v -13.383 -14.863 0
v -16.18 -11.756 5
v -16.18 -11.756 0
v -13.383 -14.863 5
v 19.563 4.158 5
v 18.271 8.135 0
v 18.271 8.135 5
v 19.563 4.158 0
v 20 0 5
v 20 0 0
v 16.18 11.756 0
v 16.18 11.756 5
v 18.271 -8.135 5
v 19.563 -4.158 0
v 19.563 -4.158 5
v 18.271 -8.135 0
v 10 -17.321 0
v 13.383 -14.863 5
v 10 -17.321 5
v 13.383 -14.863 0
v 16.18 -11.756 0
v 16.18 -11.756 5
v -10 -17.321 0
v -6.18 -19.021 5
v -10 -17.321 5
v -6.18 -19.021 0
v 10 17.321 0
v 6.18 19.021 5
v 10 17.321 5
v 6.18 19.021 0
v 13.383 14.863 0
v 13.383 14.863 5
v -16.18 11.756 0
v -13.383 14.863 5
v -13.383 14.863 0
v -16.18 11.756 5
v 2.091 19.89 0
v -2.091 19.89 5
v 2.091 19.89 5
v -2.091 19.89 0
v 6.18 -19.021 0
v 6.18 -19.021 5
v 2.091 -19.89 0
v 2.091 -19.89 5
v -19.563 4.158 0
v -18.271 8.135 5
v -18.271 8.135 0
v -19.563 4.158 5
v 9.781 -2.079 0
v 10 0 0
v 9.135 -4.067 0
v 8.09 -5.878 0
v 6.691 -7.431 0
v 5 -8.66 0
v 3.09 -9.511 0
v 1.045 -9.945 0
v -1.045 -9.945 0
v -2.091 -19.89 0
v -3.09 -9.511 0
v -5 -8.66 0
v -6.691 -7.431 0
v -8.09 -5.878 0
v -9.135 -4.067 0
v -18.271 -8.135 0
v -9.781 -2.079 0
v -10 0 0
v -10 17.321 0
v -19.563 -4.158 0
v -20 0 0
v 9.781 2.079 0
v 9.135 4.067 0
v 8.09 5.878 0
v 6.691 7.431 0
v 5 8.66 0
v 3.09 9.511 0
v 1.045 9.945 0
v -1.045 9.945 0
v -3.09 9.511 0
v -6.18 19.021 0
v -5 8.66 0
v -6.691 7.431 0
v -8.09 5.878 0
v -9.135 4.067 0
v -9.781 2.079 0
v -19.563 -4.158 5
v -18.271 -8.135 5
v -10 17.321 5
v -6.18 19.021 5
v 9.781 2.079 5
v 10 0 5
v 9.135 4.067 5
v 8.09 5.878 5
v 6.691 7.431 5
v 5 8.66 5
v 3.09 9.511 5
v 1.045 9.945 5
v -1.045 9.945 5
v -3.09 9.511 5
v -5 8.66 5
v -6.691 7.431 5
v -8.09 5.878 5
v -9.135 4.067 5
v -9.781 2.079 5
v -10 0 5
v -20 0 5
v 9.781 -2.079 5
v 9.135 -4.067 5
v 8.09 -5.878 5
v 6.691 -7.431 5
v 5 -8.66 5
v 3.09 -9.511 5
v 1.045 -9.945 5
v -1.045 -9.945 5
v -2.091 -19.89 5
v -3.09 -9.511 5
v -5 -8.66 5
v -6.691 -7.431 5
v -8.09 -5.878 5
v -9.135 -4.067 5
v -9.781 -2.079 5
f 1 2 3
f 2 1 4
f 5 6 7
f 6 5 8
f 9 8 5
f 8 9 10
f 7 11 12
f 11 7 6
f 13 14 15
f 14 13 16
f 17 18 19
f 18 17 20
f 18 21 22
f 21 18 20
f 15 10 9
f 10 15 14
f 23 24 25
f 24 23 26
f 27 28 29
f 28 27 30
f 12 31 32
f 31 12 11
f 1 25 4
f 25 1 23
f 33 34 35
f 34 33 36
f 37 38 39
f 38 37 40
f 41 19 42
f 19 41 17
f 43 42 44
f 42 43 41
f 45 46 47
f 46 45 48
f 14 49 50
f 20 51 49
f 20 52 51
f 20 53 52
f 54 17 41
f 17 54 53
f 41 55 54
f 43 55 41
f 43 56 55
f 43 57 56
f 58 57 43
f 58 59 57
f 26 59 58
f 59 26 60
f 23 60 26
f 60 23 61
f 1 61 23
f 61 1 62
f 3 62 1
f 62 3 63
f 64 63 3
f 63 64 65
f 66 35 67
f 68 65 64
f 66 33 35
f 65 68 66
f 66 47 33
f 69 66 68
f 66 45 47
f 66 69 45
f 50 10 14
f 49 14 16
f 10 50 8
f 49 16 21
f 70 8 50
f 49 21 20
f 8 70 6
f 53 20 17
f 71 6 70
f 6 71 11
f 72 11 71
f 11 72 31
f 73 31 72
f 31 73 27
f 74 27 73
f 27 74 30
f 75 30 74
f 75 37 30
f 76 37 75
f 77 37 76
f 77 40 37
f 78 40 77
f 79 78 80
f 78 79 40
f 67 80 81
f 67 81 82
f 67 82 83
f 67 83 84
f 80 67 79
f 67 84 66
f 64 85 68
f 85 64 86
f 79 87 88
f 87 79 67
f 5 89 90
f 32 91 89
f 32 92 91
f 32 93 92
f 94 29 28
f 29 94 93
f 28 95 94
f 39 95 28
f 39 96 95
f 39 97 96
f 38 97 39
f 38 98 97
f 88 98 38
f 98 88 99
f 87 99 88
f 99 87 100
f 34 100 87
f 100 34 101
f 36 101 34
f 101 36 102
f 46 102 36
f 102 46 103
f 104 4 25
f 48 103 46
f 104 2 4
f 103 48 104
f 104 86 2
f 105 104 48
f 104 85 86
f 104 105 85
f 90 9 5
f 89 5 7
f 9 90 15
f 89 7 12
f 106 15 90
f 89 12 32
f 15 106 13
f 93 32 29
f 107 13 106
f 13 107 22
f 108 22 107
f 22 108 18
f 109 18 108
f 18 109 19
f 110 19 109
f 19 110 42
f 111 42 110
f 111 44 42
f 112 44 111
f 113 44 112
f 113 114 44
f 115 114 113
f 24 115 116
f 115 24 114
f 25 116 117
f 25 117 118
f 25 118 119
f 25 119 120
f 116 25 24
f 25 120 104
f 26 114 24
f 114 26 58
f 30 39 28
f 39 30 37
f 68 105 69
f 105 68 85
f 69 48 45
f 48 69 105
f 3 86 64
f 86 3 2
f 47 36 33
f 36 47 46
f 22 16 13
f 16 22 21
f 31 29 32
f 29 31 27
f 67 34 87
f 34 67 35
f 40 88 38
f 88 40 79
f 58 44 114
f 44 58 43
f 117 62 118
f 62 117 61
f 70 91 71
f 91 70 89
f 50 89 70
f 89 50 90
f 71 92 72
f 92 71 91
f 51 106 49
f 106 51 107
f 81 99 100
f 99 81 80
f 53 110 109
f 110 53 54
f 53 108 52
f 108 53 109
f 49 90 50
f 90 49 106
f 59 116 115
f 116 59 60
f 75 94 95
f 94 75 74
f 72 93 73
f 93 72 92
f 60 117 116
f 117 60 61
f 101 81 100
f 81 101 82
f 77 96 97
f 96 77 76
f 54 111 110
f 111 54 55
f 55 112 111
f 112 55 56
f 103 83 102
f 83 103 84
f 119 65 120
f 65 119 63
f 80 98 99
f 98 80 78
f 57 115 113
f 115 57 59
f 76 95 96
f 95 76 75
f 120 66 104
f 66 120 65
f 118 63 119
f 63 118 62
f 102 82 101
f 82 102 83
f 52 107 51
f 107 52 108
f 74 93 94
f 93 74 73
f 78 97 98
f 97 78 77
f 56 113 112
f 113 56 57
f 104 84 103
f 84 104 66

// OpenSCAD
module annular_ring_body(outer_radius, thickness, inner_radius) {
    difference() {
        cylinder(h = thickness, r = outer_radius);
        translate([0, 0, -1]) // Slightly lower to ensure clean subtraction
            cylinder(h = thickness + 2, r = inner_radius);
    }
}

// Example usage
annular_ring_body(outer_radius = 20, thickness = 5, inner_radius = 10);
